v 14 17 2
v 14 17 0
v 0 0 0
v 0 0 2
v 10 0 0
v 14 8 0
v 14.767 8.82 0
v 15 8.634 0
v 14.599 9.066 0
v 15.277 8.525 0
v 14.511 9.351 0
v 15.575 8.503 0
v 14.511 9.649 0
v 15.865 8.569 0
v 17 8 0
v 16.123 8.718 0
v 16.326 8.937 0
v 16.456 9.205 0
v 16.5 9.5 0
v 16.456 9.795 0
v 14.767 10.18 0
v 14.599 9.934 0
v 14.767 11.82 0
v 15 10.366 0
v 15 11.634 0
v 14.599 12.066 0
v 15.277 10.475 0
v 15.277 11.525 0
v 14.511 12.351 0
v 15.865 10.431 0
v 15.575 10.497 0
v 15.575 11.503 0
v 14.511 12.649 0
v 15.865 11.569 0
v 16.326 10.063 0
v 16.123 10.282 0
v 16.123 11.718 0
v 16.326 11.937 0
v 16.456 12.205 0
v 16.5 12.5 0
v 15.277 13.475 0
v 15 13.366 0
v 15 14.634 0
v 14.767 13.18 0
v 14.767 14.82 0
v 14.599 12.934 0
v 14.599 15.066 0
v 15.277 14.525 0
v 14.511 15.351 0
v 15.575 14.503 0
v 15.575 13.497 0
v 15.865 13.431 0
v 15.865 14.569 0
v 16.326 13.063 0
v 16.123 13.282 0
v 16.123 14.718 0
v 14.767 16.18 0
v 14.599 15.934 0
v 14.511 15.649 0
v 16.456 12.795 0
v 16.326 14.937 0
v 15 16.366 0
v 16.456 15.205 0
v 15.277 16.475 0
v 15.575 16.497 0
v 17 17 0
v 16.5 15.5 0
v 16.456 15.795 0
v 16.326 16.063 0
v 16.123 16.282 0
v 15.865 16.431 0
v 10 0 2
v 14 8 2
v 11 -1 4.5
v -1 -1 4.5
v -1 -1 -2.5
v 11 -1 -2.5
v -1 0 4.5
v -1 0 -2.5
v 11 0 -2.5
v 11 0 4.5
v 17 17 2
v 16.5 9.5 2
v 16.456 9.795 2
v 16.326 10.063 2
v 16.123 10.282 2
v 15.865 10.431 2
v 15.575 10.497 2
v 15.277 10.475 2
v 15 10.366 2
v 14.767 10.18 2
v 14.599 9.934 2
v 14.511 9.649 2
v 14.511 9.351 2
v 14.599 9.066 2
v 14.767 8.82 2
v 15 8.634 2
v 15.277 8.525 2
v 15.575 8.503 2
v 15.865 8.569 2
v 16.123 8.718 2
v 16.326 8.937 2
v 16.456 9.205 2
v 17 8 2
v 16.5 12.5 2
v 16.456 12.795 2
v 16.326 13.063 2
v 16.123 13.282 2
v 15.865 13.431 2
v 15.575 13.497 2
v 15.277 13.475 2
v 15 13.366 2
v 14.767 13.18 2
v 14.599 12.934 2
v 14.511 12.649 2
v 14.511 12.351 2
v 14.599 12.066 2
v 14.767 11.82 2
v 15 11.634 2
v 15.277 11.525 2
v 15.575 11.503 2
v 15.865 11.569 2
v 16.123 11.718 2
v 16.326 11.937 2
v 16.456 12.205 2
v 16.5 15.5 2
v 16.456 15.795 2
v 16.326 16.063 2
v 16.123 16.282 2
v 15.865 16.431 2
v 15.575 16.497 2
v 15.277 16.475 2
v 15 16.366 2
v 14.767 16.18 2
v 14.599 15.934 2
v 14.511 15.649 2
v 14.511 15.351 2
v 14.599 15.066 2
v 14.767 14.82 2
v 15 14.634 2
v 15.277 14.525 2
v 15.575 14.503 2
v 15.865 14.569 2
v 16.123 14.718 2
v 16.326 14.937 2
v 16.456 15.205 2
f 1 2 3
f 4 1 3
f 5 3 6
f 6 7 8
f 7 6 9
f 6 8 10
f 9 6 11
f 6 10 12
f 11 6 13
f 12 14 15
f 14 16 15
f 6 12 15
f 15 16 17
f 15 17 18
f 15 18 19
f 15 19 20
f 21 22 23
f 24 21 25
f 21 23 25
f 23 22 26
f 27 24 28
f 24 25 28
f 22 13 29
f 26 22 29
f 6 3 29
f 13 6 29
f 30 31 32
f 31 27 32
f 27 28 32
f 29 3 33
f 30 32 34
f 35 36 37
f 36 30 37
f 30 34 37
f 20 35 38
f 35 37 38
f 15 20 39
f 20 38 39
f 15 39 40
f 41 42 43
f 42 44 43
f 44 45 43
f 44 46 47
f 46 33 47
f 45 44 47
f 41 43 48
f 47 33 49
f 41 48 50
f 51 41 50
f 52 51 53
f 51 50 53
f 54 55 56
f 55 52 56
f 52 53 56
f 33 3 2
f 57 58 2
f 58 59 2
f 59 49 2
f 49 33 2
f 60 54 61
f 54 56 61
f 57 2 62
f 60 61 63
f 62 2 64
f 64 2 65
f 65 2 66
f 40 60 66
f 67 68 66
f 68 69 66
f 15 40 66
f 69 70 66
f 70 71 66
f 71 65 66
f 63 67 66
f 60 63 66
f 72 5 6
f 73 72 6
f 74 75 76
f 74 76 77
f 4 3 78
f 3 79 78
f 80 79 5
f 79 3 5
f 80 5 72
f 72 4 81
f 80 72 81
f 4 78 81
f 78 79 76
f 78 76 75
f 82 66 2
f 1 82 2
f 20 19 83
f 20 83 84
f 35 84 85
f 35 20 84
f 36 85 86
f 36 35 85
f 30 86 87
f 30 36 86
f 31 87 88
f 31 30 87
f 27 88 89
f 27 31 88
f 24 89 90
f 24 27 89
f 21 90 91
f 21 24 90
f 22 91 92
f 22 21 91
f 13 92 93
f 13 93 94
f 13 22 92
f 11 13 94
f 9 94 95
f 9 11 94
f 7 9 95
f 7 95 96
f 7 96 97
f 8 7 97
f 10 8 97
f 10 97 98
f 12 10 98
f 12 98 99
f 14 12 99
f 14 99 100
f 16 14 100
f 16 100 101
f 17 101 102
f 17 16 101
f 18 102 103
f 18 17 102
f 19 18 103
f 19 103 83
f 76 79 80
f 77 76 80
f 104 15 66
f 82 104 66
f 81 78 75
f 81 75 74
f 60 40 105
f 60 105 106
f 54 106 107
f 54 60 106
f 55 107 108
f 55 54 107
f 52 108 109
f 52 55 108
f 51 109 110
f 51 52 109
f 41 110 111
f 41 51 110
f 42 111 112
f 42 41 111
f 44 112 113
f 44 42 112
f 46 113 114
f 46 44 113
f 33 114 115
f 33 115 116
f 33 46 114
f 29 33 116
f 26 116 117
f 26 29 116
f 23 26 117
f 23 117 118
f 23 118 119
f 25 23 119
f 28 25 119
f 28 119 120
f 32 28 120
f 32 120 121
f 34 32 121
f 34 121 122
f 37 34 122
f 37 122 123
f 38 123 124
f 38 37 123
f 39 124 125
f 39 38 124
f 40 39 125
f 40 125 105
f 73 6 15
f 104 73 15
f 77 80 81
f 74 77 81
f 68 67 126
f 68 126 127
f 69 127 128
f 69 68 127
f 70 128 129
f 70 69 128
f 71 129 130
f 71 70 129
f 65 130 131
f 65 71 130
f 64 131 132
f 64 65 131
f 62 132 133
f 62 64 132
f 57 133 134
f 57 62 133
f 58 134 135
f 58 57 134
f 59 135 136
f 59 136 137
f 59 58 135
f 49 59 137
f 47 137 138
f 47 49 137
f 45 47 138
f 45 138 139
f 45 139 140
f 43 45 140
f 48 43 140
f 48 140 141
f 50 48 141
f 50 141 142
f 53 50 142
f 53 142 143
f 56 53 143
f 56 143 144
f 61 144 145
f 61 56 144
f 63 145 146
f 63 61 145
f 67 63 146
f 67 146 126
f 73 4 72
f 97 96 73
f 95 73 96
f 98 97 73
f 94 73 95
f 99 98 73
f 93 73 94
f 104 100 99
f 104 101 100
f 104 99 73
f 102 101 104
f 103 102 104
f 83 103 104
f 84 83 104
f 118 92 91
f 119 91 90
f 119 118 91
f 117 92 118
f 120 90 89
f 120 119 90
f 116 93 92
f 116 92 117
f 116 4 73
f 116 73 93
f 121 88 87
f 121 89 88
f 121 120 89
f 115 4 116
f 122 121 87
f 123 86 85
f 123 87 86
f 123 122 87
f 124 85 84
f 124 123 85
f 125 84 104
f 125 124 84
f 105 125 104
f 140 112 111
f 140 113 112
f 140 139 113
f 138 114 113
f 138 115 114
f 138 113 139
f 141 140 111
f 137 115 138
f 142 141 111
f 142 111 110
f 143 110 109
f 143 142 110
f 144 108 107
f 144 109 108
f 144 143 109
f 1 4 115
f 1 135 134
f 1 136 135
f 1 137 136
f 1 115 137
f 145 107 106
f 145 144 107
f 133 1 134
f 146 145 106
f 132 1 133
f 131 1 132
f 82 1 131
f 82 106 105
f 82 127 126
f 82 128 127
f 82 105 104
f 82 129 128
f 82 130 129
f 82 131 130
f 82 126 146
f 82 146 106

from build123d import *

# Parameters (mm, degrees)
SCHIZZO1_R                   = 1
ESTRUSIONE_ESTRUSIONE1_DEPTH = 2
SCHIZZO2_W                   = 12
SCHIZZO2_H                   = 7
ESTRUSIONE_ESTRUSIONE2_DEPTH = 1


with BuildPart() as part:
    # Schizzo1 → Estrusione-Estrusione1 (new body)
    with BuildSketch(Plane.XY):
        Polygon((0, 0), (10, 0), (14, 8), (17, 8), (17, 17), (14, 17), align=None)
        with Locations((15.5, 15.5)):
            Circle(SCHIZZO1_R, mode=Mode.SUBTRACT)
        with Locations((15.5, 12.5)):
            Circle(SCHIZZO1_R, mode=Mode.SUBTRACT)
        with Locations((15.5, 9.5)):
            Circle(SCHIZZO1_R, mode=Mode.SUBTRACT)
    extrude(amount=ESTRUSIONE_ESTRUSIONE1_DEPTH)

    # Schizzo2 → Estrusione-Estrusione2 (add)
    with BuildSketch(Plane.XZ):
        with Locations((5, 1)):
            Rectangle(SCHIZZO2_W, SCHIZZO2_H)
    extrude(amount=ESTRUSIONE_ESTRUSIONE2_DEPTH)


solid = part.part
